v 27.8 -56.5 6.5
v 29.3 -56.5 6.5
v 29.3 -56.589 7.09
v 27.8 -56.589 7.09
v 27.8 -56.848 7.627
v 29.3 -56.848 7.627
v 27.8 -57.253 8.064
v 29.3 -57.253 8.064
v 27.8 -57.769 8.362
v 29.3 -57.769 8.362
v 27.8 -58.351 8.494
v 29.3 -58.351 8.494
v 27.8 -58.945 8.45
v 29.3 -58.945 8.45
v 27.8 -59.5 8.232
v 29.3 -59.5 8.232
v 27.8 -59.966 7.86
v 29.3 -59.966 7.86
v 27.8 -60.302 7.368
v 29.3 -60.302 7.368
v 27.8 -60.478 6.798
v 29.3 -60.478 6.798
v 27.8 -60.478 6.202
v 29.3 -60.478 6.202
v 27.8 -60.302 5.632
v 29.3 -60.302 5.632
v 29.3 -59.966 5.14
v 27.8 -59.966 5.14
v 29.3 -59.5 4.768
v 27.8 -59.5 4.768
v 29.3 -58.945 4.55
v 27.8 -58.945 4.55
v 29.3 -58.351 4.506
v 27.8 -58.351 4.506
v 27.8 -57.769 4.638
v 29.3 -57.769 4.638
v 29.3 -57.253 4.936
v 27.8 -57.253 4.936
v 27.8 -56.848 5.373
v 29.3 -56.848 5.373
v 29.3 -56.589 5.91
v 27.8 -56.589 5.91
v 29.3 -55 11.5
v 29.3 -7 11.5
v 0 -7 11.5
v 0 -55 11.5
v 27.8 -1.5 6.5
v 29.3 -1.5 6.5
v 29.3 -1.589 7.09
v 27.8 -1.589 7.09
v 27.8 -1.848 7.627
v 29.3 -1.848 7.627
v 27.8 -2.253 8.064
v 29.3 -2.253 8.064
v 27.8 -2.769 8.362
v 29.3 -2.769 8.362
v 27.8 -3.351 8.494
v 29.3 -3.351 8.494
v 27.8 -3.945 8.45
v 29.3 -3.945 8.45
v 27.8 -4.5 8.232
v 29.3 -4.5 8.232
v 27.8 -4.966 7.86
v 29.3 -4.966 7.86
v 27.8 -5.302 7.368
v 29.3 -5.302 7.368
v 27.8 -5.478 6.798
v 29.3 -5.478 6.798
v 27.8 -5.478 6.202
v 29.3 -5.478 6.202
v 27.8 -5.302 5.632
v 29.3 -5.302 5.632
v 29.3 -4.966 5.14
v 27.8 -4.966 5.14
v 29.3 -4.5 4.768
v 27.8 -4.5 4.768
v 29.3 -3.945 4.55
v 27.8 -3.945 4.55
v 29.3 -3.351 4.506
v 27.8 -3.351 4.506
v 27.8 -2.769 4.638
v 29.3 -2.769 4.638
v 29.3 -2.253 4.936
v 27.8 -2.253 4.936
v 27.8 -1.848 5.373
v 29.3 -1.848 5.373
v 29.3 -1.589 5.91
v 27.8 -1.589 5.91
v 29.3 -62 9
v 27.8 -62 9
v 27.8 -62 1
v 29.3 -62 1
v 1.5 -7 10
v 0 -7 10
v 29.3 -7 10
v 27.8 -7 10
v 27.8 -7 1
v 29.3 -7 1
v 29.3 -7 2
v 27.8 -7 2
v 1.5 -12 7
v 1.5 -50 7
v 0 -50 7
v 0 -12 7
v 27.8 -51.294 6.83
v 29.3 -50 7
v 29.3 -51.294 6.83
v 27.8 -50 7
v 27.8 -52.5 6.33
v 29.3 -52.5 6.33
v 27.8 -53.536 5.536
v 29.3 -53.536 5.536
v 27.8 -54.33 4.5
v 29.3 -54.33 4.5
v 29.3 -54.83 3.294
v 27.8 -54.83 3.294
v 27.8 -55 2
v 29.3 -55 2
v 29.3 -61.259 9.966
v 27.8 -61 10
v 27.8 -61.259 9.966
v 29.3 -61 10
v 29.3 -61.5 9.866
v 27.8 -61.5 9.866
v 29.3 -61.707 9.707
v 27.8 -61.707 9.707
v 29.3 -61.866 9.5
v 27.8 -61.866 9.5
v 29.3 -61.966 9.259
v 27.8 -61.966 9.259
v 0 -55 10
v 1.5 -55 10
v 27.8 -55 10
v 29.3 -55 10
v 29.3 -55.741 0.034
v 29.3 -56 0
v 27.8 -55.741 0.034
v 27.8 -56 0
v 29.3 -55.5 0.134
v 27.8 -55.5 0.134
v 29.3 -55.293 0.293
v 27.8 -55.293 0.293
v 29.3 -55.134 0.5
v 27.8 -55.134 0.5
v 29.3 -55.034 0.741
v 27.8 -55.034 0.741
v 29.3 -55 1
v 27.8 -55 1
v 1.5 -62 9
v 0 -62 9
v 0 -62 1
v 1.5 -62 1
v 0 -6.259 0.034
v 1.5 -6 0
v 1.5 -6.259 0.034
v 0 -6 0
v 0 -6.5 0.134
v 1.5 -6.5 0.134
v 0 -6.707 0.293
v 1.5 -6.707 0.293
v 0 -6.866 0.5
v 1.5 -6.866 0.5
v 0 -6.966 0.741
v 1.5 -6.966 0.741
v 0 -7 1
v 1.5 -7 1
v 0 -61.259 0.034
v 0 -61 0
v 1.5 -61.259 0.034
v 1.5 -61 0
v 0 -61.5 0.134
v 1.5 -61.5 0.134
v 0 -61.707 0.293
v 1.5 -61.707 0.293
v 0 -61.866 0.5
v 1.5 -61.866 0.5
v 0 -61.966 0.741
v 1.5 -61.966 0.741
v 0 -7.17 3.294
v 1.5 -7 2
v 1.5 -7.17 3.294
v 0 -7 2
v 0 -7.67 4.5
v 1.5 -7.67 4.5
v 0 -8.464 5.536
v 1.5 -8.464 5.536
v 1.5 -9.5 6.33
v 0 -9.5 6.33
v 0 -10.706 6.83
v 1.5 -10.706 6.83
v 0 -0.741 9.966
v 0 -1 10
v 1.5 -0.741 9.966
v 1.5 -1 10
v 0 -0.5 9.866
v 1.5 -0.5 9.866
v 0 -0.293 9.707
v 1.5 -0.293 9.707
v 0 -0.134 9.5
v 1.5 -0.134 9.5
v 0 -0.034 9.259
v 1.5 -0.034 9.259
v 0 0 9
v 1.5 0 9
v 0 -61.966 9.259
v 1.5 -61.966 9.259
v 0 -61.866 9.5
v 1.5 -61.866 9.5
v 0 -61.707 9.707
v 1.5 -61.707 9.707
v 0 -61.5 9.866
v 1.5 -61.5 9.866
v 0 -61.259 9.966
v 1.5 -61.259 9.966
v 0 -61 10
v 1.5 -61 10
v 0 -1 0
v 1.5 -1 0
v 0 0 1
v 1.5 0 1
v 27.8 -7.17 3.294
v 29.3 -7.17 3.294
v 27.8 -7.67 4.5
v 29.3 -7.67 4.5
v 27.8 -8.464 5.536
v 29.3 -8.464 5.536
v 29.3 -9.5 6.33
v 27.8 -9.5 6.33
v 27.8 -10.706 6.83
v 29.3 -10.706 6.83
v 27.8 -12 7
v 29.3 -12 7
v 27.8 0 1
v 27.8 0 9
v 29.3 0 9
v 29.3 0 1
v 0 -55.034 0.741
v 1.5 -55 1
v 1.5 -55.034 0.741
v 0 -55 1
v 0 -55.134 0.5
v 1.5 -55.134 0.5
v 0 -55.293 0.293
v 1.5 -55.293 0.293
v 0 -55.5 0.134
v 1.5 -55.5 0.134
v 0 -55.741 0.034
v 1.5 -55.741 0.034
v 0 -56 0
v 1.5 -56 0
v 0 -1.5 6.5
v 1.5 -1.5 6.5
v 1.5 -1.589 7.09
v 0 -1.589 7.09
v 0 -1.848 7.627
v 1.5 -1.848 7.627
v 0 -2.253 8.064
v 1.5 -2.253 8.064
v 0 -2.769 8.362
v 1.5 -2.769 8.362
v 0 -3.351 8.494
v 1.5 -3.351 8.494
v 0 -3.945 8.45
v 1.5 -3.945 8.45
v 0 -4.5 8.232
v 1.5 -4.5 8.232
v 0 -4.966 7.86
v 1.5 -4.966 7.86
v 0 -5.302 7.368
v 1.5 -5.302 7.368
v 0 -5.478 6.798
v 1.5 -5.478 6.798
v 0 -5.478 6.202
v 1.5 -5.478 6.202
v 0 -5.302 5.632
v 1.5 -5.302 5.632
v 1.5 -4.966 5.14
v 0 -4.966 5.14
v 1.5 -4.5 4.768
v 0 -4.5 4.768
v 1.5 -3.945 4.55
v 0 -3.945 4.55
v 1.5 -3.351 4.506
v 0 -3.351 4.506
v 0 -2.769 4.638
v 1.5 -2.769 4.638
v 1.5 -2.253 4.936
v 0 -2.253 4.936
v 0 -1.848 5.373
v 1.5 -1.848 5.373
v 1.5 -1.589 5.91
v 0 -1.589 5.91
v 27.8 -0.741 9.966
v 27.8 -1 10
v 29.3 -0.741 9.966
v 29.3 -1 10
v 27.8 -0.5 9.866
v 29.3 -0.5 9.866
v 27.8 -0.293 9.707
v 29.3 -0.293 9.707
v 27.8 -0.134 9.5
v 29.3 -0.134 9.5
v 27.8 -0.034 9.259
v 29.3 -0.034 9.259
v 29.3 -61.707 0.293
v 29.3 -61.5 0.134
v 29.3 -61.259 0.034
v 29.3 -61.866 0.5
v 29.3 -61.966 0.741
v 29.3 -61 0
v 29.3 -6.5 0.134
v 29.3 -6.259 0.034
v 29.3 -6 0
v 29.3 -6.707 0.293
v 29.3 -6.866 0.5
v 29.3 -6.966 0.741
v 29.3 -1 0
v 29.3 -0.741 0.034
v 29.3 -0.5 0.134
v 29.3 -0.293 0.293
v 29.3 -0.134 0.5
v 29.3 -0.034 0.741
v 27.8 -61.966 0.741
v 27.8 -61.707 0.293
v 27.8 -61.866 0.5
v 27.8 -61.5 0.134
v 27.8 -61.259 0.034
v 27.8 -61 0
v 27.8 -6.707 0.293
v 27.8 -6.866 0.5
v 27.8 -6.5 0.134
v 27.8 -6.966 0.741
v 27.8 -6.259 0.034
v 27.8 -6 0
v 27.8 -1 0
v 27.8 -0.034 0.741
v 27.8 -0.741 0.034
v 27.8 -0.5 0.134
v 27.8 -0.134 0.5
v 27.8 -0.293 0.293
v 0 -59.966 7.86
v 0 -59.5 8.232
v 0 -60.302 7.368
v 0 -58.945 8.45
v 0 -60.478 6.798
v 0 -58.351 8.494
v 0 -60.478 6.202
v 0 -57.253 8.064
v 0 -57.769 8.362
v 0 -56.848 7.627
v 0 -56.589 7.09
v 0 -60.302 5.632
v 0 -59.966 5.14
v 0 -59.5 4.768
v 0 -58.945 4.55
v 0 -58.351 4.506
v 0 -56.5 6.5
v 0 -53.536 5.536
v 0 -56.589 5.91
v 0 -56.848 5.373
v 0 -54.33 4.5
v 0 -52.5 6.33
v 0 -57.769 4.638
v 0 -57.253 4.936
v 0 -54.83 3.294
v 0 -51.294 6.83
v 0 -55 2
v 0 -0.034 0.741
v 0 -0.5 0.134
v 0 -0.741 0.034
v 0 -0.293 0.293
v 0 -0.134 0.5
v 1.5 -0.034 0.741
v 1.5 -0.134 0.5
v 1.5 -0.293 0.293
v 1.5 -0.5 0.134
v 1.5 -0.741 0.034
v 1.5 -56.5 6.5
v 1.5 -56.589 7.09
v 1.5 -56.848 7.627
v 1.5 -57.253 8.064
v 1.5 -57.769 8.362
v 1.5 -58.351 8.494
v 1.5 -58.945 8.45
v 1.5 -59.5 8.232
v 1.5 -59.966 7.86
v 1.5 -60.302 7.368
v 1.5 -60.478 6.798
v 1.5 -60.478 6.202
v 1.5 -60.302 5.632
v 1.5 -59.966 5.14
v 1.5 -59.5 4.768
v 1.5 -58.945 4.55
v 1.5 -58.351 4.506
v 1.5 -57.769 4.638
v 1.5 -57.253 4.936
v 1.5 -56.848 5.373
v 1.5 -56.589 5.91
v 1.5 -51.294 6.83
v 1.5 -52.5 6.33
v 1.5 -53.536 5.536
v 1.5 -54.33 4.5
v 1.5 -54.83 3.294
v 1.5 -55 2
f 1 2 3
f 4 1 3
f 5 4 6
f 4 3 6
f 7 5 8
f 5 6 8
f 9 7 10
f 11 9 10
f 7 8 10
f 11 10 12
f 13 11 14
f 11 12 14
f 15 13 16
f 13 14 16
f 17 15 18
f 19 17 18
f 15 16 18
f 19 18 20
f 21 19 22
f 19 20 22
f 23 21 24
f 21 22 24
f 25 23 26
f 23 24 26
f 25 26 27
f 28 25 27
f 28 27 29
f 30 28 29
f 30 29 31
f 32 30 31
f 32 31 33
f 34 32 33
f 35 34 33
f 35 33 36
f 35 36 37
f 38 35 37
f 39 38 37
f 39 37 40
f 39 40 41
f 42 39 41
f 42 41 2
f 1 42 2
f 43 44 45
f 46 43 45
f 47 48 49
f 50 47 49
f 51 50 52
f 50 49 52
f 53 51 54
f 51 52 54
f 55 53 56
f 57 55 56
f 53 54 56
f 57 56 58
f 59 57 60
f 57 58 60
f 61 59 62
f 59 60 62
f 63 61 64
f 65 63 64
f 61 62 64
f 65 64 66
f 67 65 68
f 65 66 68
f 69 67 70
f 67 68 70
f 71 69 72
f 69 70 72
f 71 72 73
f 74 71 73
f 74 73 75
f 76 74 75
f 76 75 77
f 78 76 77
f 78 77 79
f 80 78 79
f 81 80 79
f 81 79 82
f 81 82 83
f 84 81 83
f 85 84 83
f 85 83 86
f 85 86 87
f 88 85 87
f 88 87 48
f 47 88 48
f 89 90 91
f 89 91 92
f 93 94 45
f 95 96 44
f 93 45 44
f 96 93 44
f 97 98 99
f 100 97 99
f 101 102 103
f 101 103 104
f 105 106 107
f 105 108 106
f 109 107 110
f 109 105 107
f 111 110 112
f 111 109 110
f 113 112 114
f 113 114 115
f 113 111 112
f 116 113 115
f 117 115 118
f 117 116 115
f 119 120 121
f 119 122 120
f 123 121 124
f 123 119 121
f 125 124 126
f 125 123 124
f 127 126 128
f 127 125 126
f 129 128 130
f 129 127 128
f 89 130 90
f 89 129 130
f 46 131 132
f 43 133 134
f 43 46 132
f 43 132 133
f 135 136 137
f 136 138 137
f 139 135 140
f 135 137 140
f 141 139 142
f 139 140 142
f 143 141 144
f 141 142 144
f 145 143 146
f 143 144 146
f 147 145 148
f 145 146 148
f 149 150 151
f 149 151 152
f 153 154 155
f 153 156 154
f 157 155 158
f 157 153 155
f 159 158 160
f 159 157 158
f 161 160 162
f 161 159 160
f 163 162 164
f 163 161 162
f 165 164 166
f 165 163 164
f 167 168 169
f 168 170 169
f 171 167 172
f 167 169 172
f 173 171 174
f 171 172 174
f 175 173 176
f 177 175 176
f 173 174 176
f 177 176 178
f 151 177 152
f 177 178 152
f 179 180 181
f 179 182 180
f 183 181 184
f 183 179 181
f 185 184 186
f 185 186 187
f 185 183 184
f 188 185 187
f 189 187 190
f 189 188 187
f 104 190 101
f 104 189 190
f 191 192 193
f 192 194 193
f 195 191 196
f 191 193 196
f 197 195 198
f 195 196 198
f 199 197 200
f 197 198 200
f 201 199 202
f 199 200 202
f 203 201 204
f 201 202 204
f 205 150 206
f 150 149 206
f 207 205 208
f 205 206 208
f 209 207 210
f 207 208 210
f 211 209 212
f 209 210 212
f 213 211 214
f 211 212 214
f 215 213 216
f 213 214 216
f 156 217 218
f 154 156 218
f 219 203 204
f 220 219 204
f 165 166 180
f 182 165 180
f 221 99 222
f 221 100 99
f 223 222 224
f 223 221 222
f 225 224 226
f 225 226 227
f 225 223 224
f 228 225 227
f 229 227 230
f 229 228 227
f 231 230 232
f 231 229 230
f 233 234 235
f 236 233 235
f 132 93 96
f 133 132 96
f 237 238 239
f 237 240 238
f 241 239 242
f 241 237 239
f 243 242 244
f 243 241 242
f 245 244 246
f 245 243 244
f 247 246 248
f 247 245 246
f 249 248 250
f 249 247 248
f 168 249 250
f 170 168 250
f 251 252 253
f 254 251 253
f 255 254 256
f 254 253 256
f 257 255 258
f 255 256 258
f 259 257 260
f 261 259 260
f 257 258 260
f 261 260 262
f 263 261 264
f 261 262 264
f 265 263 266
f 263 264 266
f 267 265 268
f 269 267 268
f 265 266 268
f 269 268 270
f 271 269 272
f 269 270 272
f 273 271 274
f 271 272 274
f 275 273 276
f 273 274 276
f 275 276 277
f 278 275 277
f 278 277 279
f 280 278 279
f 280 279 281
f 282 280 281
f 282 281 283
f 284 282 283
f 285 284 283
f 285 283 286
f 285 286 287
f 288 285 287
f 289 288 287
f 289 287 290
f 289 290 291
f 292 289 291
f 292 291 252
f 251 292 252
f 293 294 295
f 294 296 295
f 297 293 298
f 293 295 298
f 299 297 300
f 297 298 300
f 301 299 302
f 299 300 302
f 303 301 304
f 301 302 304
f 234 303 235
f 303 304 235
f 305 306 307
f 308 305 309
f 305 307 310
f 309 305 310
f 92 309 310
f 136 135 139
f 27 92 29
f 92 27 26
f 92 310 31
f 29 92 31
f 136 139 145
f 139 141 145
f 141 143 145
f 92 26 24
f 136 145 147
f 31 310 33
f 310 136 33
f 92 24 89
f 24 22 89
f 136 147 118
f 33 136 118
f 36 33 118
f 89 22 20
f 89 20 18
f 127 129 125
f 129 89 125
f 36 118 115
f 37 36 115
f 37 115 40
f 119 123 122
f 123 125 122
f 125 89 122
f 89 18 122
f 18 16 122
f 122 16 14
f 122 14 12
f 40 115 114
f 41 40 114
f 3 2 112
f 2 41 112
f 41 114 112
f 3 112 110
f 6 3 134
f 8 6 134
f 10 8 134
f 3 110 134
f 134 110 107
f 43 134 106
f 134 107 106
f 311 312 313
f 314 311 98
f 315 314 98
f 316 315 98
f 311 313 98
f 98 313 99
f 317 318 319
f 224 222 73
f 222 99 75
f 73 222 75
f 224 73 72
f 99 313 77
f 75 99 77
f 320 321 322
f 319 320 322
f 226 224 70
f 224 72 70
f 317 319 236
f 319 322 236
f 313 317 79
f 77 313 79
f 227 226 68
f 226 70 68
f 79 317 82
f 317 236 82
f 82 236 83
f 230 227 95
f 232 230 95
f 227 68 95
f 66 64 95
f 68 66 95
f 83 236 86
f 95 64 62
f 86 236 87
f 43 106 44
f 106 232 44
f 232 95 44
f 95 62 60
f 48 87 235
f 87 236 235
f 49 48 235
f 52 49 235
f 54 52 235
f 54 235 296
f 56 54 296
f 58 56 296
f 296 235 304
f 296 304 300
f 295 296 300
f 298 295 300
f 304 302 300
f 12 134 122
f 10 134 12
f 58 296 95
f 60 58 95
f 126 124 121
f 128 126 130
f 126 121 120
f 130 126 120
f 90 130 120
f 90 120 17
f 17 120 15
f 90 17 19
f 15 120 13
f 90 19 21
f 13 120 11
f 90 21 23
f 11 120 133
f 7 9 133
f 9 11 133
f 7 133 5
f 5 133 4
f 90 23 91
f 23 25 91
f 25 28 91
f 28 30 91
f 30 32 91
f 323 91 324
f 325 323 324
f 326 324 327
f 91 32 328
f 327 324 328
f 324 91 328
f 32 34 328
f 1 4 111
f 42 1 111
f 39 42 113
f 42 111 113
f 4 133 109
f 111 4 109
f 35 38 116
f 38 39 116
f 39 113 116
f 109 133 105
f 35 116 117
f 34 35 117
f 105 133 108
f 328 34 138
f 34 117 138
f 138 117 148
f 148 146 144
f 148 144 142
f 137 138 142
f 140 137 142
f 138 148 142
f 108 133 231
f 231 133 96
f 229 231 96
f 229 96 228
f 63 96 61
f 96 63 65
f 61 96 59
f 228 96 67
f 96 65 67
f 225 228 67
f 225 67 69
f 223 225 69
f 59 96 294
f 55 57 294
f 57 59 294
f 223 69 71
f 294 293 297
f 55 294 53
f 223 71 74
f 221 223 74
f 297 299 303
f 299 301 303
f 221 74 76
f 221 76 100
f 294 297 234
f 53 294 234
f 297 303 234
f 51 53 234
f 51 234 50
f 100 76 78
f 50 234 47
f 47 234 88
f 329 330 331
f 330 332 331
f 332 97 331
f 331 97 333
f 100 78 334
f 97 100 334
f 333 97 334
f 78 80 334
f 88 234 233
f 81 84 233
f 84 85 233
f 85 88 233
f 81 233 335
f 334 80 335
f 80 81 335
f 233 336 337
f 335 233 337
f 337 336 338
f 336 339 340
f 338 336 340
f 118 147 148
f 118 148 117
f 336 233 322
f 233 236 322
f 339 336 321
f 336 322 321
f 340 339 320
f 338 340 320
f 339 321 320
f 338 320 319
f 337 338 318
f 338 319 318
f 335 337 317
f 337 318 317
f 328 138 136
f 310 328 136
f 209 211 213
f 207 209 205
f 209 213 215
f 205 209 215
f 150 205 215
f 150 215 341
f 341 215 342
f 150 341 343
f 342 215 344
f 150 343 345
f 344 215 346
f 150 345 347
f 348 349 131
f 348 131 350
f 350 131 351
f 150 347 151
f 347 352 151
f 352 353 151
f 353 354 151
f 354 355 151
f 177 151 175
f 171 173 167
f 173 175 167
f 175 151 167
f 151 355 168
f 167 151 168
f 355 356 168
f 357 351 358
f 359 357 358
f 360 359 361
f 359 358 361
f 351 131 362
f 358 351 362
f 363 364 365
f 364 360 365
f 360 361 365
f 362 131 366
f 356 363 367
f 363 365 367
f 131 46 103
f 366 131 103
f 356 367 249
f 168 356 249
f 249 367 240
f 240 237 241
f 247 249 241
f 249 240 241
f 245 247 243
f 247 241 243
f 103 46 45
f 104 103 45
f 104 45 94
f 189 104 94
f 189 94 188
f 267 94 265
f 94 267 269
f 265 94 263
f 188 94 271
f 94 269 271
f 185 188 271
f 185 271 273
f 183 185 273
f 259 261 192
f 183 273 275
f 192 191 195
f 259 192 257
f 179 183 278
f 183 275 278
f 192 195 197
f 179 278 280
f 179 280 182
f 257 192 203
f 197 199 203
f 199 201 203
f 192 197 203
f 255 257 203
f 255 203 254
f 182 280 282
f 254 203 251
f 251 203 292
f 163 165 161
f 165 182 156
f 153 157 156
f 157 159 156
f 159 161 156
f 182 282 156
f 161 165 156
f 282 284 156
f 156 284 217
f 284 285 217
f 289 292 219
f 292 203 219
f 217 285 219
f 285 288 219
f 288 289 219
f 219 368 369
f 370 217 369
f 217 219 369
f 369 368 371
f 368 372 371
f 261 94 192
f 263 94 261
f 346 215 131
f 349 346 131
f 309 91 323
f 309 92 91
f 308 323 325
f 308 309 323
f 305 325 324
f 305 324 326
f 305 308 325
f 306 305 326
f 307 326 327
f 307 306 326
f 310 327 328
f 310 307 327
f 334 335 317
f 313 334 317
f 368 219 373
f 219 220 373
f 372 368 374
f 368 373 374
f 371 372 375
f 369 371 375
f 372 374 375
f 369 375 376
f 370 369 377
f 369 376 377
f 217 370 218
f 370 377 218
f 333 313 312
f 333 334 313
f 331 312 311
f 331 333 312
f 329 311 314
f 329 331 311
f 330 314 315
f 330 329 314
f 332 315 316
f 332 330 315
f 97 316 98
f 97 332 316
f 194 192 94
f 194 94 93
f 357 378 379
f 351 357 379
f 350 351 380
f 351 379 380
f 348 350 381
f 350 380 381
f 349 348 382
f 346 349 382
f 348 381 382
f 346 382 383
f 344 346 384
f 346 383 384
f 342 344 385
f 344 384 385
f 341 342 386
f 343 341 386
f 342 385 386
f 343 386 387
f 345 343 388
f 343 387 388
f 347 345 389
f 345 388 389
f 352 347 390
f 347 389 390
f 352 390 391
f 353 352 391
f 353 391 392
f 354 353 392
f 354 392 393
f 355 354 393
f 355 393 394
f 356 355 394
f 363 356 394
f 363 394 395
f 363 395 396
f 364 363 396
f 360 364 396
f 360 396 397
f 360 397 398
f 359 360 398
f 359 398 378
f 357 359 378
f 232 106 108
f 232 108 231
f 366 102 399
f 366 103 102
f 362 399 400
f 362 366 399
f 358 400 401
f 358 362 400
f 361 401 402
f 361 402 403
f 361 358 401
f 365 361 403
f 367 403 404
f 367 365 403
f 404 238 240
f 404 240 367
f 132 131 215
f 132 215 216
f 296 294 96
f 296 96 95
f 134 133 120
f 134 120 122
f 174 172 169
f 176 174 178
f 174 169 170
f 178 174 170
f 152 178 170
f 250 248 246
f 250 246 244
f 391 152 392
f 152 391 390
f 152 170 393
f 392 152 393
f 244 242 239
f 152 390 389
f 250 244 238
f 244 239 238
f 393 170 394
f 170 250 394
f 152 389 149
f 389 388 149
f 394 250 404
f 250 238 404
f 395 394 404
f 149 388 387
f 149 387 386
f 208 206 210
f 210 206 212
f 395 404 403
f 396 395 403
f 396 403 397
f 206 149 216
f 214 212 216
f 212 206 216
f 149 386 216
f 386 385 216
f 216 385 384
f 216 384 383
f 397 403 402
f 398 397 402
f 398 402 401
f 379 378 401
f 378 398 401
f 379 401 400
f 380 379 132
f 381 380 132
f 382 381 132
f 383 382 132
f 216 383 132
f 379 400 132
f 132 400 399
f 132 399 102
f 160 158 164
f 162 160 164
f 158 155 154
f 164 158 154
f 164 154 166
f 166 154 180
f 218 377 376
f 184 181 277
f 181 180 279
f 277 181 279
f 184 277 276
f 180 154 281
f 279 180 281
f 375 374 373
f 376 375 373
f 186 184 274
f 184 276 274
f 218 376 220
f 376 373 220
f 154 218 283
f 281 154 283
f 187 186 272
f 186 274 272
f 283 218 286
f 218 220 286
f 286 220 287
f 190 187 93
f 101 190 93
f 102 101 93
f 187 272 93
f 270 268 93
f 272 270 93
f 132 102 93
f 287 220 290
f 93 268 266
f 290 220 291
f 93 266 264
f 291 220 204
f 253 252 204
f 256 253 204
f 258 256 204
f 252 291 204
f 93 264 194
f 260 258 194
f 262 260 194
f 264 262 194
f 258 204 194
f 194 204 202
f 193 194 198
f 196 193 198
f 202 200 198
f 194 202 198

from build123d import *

# Parameters (mm, degrees)
F1_DEPTH = 62
F2_R     = 2
F3_DEPTH = 29.301
F4_W     = 48
F4_H     = 7
F5_DEPTH = 29.301
F6_R     = 1
F7_R     = 5
F8_W     = 29.3
F8_H     = 7
F9_DEPTH = 1.5
F10_R    = 1


with BuildPart() as f1:
    # F0 (on Front) → F1 (new body)
    with BuildSketch(Plane.XZ):
        Polygon((0, 11.5), (0, 0), (1.5, 0), (1.5, 10), (27.8, 10), (27.8, 0), (29.3, 0), (29.3, 11.5), align=None)
    extrude(amount=F1_DEPTH)

    # F2 (on face) → F3 (cut, through all)
    with BuildSketch(Plane.YZ.offset(29.3)):
        with Locations((-58.5, 6.5)):
            Circle(F2_R)
        with Locations((-3.5, 6.5)):
            Circle(F2_R)
    extrude(amount=-F3_DEPTH, mode=Mode.SUBTRACT)

    # F4 (on face) → F5 (cut, through all)
    with BuildSketch(Plane.YZ.offset(29.3)):
        with Locations((-31, 3.5)):
            Rectangle(F4_W, F4_H)
    extrude(amount=-F5_DEPTH, mode=Mode.SUBTRACT)

    # F6
    f6_edges = [f1.edges().sort_by_distance(p)[0] for p in [
        (28.55, -62, 0),
        (0.75, -55, 0),
        (28.55, -55, 0),
        (0.75, -62, 0),
        (28.55, 0, 0),
        (0.75, -7, 0),
        (28.55, -7, 0),
        (0.75, 0, 0),
    ]]
    fillet(f6_edges, radius=F6_R)

    # F7
    f7_edges = [f1.edges().sort_by_distance(p)[0] for p in [
        (0.75, -7, 7),
        (28.55, -7, 7),
        (0.75, -55, 7),
        (28.55, -55, 7),
    ]]
    fillet(f7_edges, radius=F7_R)

    # F8 (on face) → F9 (cut)
    with BuildSketch(Plane.XY.offset(11.5)):
        with Locations((14.65, -58.5)):
            Rectangle(F8_W, F8_H)
        with Locations((14.65, -3.5)):
            Rectangle(F8_W, F8_H)
    extrude(amount=-F9_DEPTH, mode=Mode.SUBTRACT)

    # F10
    f10_edges = [f1.edges().sort_by_distance(p)[0] for p in [
        (0.75, -62, 10),
        (28.55, -62, 10),
        (0.75, 0, 10),
        (28.55, 0, 10),
    ]]
    fillet(f10_edges, radius=F10_R)


solid = f1.part
